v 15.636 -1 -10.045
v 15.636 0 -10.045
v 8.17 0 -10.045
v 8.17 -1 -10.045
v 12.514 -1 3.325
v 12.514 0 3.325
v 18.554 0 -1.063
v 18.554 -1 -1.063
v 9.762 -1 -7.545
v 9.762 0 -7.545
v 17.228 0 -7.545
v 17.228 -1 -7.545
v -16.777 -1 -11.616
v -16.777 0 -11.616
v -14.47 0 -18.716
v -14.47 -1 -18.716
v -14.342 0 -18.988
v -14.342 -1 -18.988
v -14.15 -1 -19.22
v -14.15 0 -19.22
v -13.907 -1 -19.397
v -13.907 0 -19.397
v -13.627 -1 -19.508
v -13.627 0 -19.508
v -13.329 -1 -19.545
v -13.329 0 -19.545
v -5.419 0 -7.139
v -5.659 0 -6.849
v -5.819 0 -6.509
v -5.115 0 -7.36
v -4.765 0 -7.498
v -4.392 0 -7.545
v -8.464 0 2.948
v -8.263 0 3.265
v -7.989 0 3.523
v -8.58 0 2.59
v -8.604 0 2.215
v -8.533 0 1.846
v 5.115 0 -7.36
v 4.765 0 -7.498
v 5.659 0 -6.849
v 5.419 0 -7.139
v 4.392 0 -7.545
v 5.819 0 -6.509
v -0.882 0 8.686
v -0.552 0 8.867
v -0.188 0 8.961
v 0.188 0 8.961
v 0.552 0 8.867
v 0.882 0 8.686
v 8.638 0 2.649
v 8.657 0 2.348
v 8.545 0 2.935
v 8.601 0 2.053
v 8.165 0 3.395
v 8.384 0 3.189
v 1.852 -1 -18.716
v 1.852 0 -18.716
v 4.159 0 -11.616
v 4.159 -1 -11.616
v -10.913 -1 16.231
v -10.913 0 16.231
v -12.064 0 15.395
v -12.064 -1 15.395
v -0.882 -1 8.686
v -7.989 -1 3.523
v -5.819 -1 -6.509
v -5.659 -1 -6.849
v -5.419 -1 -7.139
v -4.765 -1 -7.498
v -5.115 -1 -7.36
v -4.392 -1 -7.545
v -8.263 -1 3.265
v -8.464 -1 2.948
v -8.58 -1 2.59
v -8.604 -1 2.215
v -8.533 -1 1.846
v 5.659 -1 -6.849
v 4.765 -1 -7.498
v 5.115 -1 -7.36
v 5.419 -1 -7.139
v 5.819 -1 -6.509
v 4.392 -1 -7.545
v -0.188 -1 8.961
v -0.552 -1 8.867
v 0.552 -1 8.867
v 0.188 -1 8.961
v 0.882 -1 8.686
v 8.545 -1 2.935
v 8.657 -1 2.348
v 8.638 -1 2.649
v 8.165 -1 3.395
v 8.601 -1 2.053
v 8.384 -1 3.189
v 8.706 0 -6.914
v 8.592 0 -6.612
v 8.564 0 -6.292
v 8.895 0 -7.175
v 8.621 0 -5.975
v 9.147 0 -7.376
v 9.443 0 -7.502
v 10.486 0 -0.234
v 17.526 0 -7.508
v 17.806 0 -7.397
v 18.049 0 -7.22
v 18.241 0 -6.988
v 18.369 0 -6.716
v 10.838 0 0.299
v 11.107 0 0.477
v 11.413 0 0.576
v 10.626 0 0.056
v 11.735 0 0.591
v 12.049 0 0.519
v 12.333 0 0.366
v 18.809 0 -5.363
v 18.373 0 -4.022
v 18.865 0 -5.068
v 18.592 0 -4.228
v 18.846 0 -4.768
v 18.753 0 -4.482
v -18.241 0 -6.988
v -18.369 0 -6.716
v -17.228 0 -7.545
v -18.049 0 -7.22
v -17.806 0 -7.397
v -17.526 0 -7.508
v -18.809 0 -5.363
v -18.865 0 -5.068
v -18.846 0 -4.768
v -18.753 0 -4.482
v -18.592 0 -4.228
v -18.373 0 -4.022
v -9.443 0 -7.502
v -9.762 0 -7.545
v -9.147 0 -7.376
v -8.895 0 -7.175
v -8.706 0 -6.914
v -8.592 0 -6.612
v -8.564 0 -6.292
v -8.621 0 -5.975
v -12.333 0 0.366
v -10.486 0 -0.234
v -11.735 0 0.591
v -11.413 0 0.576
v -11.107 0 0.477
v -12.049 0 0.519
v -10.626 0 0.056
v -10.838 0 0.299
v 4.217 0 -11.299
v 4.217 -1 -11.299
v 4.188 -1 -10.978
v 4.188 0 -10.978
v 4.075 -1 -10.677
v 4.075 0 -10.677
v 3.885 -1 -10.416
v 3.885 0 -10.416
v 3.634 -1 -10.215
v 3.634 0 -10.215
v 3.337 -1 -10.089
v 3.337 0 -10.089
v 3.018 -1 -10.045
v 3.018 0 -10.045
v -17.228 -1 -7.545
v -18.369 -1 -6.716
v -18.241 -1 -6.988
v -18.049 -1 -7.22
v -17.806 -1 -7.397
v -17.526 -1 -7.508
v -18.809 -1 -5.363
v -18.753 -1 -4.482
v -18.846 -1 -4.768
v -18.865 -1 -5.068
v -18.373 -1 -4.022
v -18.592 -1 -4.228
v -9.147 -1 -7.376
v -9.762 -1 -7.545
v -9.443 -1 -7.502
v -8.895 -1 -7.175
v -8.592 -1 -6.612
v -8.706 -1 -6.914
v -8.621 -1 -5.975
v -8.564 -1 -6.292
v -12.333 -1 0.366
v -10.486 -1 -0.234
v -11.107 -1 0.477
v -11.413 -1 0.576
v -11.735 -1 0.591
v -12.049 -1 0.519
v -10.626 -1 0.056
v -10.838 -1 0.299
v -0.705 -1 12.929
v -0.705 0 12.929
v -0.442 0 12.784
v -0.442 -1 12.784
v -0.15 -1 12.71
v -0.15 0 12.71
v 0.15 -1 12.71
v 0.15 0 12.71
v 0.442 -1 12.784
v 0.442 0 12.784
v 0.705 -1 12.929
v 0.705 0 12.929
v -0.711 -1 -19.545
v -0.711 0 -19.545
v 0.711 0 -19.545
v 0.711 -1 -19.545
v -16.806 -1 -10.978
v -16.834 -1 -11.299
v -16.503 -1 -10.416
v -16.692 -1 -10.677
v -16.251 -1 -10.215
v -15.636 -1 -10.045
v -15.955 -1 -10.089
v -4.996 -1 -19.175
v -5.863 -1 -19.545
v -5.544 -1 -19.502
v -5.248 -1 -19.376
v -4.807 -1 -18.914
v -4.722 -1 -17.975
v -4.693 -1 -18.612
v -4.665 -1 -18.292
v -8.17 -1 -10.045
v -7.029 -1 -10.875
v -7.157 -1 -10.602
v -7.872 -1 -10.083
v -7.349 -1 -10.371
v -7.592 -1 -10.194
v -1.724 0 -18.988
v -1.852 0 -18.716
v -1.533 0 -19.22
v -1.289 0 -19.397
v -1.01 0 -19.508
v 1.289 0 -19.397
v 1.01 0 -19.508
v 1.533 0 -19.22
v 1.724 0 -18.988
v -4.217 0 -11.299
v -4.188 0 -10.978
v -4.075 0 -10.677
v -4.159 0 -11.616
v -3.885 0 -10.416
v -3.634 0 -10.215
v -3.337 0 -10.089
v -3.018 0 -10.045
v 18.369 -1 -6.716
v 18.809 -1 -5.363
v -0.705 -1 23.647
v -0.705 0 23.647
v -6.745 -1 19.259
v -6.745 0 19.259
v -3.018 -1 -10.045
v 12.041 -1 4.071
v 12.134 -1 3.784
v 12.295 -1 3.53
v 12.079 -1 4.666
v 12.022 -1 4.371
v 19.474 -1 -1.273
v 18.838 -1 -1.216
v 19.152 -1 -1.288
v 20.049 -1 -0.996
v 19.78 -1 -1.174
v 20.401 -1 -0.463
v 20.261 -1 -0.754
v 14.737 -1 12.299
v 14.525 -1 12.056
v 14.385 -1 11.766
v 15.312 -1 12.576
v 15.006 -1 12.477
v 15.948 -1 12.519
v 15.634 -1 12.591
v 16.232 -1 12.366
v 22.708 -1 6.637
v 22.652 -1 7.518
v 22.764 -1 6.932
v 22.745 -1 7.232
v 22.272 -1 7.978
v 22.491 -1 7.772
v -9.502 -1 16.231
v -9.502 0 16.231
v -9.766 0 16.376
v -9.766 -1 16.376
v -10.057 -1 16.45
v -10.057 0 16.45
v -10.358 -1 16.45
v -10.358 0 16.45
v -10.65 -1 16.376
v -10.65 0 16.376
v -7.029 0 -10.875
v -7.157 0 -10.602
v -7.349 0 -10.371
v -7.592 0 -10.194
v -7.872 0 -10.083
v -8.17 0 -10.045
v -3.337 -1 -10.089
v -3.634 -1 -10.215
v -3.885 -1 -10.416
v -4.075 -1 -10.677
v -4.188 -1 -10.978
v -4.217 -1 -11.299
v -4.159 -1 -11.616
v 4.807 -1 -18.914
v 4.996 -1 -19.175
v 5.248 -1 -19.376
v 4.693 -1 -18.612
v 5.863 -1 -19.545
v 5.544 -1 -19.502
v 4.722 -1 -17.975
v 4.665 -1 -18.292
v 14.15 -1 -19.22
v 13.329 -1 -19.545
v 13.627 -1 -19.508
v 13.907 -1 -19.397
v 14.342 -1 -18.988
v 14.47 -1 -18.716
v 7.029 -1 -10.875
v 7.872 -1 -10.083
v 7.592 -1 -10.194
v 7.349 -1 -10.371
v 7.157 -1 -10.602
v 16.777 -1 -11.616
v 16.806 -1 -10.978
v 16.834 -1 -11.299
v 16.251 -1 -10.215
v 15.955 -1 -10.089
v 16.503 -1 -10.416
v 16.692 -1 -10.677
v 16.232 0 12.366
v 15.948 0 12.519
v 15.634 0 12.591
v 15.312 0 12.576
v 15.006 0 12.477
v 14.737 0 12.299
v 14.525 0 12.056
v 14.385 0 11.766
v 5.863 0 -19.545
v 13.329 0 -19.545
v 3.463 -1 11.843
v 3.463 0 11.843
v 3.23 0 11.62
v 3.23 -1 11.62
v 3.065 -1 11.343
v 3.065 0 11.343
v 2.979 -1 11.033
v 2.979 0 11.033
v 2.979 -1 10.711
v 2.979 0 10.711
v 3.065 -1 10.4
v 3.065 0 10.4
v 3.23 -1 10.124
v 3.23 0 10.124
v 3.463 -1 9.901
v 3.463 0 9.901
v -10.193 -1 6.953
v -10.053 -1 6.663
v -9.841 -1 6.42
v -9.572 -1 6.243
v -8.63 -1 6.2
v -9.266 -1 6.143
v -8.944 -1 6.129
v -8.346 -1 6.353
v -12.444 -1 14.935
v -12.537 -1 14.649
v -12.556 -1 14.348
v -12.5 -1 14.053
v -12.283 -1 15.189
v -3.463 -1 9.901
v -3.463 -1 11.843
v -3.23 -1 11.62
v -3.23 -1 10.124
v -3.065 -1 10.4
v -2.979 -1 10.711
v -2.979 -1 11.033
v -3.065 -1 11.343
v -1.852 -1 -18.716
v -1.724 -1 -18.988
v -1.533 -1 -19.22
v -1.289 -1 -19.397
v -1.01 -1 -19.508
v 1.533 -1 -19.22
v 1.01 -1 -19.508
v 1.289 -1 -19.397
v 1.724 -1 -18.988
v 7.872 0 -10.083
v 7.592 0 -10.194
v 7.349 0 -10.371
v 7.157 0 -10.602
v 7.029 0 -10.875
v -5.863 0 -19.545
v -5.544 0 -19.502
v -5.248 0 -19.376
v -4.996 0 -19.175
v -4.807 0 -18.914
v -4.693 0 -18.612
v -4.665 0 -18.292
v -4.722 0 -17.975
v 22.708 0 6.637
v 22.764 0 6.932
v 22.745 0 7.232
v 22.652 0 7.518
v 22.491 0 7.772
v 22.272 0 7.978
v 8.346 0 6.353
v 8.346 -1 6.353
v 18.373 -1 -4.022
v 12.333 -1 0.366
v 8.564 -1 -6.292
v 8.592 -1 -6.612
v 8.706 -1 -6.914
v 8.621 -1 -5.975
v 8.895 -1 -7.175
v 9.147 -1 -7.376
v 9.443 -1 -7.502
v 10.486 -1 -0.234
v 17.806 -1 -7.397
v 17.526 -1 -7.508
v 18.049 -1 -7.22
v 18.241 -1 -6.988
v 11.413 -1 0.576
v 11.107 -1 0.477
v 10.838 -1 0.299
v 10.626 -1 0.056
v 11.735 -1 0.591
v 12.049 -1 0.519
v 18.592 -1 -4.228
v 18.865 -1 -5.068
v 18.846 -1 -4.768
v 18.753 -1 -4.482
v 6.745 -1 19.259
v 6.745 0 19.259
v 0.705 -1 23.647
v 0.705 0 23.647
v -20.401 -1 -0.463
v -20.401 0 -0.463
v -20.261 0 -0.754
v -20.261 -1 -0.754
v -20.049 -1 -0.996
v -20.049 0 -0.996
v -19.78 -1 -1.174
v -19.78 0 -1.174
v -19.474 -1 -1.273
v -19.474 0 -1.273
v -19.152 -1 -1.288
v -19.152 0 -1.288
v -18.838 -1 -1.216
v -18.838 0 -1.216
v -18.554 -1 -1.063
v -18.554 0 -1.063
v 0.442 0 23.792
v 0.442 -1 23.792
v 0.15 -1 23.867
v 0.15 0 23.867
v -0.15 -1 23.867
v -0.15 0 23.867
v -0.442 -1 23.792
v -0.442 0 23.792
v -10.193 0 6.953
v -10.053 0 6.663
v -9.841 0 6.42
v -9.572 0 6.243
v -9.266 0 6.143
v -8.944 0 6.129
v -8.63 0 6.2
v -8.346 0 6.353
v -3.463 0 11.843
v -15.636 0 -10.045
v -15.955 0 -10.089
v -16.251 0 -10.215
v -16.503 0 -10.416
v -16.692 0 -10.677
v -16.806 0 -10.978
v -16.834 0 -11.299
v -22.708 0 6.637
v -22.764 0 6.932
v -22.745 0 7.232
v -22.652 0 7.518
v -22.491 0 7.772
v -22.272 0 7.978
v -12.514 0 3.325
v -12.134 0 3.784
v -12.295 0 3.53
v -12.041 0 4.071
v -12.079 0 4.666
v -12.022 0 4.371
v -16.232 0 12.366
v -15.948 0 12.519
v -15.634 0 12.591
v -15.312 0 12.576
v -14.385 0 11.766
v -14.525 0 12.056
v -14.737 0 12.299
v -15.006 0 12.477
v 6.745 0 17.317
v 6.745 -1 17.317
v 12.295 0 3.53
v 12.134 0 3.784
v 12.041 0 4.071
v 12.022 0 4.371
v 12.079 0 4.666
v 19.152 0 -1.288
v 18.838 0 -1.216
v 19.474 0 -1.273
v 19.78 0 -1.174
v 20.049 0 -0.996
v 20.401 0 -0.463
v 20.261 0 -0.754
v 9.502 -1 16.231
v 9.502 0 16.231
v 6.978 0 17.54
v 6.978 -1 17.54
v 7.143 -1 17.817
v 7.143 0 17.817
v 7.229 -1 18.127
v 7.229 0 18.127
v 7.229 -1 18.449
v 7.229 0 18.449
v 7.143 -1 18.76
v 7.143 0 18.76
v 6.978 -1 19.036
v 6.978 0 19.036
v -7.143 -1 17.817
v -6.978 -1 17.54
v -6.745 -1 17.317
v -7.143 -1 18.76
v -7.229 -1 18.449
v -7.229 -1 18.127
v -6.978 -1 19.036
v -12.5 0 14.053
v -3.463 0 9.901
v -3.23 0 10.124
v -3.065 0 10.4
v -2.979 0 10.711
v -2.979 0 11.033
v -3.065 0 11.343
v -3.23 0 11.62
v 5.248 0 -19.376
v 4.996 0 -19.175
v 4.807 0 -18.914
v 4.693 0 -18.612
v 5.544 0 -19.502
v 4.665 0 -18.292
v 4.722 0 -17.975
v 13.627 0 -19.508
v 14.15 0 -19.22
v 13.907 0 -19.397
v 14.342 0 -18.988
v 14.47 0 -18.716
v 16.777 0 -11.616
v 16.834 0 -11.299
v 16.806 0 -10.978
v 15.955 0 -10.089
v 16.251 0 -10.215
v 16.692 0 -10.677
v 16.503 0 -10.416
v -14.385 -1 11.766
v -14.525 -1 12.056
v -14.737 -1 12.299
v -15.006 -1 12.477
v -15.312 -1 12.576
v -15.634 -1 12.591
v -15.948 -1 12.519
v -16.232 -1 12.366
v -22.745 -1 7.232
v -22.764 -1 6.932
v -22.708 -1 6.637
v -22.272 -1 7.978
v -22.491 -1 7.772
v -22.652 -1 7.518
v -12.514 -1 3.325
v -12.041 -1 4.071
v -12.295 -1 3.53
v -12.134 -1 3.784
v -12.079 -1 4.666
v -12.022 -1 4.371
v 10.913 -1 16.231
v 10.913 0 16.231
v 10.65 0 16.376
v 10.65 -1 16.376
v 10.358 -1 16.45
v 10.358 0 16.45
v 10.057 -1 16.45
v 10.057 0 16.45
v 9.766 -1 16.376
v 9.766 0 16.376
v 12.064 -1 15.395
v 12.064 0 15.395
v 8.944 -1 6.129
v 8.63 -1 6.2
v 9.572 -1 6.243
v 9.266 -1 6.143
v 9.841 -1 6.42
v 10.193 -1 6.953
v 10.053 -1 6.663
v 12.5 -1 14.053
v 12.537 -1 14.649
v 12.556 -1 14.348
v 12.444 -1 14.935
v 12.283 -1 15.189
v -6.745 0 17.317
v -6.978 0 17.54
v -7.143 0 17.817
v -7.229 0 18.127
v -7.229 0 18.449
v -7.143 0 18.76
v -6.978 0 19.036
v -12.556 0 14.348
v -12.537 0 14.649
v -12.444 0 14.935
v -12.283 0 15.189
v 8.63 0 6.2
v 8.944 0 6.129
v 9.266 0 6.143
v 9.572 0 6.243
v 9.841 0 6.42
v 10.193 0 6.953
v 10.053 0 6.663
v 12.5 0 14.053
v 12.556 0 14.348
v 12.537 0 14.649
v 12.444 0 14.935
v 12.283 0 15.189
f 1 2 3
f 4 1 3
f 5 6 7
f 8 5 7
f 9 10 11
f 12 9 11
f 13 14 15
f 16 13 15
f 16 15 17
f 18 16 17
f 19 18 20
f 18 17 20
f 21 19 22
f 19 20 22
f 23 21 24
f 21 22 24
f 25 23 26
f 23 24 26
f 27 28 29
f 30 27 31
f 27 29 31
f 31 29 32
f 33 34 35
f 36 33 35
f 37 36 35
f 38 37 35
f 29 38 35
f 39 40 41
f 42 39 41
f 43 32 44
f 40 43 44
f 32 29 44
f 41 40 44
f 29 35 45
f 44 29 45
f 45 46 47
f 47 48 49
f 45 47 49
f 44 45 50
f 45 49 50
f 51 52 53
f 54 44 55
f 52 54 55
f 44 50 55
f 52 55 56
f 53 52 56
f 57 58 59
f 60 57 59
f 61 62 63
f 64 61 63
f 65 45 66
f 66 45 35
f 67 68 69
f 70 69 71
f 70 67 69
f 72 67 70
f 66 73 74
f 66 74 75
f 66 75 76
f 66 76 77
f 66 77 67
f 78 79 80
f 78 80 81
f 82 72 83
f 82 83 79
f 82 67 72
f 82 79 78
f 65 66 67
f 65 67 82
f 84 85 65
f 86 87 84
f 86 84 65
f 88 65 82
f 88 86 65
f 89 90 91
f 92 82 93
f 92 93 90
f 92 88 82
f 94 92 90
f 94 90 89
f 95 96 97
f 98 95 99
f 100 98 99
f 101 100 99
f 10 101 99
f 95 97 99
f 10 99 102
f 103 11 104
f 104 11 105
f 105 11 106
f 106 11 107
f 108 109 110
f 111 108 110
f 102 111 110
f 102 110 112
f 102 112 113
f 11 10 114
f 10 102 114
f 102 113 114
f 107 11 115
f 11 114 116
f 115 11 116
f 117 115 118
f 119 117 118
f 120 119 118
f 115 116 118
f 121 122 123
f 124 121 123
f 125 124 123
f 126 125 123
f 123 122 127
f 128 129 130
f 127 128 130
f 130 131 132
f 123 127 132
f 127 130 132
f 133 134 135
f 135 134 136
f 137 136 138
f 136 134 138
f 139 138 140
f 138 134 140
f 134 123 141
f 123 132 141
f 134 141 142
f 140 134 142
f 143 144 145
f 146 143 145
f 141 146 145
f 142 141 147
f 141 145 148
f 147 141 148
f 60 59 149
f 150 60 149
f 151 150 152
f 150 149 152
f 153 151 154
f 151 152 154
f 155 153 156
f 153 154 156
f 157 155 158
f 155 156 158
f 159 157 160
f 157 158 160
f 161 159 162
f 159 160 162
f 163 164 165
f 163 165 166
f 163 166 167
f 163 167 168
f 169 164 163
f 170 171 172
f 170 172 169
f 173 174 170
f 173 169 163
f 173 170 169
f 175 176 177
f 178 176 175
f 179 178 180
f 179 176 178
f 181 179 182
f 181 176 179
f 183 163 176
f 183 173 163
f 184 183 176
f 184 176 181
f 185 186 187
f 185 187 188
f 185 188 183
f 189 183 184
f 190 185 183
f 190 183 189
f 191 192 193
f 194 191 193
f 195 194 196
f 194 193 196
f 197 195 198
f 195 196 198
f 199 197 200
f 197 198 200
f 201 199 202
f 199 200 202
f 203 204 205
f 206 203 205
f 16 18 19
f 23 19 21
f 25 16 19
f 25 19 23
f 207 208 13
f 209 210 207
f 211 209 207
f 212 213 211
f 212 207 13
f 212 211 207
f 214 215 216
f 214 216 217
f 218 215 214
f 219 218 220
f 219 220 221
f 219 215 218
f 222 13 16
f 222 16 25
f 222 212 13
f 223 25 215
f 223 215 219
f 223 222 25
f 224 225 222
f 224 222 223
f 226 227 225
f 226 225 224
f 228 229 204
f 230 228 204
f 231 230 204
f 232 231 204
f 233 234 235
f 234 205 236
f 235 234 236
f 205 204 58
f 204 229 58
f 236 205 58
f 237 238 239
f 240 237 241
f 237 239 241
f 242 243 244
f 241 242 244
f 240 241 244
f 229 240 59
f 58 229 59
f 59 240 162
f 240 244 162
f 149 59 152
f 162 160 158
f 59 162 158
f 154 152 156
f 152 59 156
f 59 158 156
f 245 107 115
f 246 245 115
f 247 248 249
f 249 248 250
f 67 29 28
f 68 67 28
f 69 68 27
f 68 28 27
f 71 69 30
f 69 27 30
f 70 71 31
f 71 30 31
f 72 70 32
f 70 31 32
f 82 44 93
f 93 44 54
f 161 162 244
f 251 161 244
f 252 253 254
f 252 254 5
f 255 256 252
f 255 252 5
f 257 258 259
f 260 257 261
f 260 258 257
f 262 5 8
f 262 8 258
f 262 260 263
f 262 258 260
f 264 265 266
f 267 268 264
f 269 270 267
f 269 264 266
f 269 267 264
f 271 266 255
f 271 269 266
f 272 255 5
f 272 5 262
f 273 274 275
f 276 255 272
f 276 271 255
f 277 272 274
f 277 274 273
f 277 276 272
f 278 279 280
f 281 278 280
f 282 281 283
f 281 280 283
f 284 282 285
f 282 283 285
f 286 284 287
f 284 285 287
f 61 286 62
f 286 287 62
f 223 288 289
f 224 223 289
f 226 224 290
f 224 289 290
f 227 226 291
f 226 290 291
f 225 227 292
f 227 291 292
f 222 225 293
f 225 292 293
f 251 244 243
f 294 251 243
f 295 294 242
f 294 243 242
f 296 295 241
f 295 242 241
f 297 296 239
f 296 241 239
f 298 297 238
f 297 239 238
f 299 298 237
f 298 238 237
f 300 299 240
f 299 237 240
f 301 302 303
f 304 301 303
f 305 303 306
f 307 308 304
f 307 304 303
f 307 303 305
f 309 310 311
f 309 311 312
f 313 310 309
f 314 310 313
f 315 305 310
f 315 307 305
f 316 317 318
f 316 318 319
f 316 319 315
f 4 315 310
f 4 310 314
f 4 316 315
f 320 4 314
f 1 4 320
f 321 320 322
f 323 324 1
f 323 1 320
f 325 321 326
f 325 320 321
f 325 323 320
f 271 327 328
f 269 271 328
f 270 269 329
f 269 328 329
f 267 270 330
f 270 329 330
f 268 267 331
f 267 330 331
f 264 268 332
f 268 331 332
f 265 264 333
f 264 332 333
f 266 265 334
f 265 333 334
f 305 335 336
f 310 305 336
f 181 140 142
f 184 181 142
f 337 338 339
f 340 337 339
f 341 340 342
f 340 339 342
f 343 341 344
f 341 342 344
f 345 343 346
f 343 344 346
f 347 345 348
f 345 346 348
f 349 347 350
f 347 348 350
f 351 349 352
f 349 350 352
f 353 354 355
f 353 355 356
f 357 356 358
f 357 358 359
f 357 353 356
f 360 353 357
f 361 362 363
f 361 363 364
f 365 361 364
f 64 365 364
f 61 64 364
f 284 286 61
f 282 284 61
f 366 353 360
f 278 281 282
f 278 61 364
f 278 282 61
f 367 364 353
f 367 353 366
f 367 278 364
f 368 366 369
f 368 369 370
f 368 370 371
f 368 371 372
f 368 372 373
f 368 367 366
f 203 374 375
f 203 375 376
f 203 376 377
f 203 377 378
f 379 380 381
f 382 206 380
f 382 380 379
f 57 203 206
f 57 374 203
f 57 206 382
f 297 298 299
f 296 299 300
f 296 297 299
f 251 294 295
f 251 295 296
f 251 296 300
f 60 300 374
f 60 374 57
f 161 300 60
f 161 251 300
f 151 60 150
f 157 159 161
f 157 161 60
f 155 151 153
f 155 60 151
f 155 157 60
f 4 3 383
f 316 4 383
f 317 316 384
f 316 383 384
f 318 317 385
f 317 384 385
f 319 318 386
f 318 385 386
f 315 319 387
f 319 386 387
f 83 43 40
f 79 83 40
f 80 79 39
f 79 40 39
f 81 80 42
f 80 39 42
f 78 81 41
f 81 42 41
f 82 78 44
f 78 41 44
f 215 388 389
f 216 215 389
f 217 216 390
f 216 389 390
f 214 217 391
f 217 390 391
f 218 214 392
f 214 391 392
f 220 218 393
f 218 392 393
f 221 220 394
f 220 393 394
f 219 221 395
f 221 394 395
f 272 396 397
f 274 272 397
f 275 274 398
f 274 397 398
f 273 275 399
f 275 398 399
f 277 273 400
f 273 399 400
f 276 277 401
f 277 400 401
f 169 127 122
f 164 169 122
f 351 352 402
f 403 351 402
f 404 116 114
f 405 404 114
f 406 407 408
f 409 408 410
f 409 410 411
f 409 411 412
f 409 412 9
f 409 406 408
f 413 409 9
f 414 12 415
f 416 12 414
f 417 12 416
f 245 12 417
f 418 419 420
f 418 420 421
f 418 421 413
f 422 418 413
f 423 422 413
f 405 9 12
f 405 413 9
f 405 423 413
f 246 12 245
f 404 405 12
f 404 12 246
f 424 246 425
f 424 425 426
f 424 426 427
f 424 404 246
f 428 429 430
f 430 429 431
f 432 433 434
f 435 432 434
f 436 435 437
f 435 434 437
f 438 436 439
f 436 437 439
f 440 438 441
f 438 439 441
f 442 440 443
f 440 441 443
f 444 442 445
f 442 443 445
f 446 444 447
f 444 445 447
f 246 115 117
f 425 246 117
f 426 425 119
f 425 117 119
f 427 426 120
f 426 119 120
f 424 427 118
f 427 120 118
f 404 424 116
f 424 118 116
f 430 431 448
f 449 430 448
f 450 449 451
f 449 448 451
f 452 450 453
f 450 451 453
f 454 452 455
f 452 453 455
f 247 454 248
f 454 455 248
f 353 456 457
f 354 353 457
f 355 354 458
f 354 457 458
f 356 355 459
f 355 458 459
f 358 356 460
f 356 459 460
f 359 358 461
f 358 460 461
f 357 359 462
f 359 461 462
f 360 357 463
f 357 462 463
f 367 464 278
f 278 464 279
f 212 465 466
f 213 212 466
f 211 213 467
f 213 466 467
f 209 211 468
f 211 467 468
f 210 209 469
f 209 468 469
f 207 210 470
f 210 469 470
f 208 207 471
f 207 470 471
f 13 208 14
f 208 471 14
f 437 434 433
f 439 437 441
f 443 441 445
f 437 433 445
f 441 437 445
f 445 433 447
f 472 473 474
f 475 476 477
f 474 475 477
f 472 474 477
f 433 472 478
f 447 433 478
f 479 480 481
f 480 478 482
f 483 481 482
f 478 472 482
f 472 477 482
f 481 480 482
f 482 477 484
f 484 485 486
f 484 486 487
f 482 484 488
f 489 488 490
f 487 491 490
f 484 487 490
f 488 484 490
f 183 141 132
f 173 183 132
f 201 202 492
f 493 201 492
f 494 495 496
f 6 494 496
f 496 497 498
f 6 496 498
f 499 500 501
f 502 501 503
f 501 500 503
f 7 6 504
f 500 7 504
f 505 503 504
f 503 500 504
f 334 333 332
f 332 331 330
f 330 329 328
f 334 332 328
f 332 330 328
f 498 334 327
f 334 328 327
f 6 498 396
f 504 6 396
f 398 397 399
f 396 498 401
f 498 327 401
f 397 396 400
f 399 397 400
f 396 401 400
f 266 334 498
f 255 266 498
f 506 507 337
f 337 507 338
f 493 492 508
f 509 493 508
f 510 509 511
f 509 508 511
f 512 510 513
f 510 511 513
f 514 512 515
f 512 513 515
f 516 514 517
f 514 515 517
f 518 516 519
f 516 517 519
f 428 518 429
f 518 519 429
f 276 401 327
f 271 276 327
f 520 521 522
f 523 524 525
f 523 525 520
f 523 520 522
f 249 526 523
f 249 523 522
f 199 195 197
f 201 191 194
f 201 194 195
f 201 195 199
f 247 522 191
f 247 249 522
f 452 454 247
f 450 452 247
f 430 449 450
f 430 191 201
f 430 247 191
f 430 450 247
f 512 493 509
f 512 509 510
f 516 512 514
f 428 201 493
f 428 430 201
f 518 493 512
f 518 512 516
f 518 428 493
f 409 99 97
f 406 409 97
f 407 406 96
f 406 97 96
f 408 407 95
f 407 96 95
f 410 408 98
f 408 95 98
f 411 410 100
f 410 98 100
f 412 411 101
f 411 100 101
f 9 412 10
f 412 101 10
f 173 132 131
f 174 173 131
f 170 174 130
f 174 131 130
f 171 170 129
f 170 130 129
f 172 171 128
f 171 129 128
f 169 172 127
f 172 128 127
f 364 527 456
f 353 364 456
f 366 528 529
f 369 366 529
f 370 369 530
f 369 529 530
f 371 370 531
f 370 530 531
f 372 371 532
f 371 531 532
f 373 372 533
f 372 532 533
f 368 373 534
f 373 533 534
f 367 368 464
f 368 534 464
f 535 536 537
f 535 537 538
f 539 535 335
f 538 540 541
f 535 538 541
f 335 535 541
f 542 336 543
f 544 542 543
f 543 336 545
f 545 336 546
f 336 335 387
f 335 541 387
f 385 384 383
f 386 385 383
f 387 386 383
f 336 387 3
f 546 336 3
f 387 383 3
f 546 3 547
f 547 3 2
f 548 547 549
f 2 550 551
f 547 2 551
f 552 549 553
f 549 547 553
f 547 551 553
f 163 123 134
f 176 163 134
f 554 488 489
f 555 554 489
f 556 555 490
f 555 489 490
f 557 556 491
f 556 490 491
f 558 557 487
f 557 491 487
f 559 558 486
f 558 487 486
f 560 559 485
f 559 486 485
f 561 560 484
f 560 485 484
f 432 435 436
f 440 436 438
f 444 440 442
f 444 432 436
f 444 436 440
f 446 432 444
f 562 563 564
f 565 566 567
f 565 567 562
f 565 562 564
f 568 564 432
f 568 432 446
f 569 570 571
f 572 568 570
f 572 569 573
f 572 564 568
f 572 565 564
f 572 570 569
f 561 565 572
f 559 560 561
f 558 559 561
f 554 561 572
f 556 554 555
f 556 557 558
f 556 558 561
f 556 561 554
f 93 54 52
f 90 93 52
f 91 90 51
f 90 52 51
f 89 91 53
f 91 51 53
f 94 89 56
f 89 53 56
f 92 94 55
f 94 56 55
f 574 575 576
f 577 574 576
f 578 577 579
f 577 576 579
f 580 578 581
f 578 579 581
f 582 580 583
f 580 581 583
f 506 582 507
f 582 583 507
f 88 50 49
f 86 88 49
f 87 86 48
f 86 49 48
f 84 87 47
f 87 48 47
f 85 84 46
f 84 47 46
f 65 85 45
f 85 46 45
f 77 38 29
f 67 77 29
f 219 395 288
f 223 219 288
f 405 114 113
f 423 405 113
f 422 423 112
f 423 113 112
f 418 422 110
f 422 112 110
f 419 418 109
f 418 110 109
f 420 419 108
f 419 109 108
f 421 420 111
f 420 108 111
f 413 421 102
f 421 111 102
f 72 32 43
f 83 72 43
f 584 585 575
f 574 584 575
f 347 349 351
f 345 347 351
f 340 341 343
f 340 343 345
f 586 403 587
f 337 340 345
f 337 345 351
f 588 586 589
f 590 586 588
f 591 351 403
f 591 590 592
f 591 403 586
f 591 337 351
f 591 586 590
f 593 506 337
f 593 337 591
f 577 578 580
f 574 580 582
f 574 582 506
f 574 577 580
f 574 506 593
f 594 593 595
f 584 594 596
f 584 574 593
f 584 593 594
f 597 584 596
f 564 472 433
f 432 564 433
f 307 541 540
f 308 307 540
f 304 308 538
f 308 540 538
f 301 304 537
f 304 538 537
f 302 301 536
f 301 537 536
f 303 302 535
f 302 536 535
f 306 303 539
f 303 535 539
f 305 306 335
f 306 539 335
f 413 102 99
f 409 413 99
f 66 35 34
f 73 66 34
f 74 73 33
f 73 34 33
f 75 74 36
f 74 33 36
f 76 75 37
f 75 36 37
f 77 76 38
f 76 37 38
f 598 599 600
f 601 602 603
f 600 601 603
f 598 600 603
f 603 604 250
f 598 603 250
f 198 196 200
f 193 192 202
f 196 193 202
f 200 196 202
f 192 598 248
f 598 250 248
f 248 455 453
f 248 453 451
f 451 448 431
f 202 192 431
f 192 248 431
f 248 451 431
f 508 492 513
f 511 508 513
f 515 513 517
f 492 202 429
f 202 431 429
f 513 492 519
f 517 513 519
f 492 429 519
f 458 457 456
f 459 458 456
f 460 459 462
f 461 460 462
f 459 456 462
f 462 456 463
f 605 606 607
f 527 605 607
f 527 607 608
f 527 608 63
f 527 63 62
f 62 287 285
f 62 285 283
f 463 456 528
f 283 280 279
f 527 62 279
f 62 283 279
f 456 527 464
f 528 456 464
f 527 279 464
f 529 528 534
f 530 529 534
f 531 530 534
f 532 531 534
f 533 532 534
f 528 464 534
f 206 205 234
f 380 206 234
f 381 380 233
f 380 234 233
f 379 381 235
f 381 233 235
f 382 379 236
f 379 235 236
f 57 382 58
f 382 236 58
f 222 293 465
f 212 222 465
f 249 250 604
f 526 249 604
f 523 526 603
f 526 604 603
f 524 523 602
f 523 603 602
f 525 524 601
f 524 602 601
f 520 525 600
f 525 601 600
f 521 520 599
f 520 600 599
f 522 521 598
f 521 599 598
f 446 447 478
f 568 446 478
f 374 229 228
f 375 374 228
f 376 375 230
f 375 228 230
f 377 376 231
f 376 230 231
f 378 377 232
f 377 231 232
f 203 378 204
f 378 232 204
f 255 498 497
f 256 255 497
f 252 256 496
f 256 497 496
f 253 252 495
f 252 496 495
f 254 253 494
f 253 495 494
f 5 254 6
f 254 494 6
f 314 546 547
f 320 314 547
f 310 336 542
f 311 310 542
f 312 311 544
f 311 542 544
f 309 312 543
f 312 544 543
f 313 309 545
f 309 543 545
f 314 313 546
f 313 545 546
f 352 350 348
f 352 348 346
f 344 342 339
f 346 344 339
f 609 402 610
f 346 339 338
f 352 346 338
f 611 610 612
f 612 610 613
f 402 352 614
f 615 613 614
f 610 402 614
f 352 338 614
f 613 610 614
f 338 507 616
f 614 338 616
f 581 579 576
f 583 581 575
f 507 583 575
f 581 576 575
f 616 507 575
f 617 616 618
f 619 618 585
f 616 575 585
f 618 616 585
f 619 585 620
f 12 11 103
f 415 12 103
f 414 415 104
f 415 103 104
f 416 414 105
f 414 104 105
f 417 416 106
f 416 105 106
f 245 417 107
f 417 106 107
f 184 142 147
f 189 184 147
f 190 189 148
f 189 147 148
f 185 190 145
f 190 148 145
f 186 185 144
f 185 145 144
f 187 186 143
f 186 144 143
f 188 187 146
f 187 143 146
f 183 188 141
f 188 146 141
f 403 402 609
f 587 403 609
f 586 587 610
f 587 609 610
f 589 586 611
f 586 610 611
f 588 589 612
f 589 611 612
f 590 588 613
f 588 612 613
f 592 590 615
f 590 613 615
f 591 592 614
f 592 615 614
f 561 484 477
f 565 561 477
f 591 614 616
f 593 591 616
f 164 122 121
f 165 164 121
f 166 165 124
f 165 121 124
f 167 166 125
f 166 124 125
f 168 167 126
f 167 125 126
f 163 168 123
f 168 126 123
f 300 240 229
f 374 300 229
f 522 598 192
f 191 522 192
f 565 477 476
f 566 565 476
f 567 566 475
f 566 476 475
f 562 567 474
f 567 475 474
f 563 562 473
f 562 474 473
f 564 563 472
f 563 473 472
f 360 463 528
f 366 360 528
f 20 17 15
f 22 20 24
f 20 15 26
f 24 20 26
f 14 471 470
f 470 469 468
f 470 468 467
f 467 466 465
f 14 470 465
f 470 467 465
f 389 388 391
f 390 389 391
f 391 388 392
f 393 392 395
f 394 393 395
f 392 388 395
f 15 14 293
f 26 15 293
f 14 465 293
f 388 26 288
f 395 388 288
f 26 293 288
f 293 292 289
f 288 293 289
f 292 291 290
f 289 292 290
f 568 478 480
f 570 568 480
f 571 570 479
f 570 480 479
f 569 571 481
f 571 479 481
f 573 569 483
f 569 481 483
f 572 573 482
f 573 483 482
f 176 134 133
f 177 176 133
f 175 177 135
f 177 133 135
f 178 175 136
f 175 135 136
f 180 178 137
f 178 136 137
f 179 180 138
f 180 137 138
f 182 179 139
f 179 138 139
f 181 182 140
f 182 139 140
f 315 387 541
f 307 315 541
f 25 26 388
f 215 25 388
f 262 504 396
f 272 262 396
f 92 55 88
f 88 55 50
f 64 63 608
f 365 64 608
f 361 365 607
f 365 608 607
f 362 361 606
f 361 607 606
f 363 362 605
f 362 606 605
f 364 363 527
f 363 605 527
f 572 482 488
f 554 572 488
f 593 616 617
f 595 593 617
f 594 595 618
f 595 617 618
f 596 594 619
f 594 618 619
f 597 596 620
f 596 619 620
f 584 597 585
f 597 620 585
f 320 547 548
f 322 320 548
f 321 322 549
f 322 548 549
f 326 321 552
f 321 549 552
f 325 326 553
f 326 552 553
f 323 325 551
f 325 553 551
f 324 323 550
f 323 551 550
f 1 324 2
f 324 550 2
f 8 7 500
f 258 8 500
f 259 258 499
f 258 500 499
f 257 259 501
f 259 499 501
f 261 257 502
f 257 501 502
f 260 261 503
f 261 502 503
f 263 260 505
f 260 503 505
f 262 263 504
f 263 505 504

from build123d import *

# Parameters (mm, degrees)
F1_DEPTH = 1


with BuildPart() as f1:
    # F0 (on Front) → F1 (new body)
    with BuildSketch(Plane.XZ):
        with BuildLine():
            ThreePointArc((-12.514456, 3.324552), (-12.078531, 3.924552), (-12.078531, 4.666193))
            Line((-12.078531, 4.666193), (-14.38546, 11.766193))
            ThreePointArc((-14.38546, 11.766193), (-15.155908, 12.536641), (-16.232071, 12.366193))
            Line((-16.232071, 12.366193), (-22.271691, 7.978152))
            ThreePointArc((-22.271691, 7.978152), (-22.707617, 7.378152), (-22.707617, 6.636511))
            Line((-22.707617, 6.636511), (-20.400687, -0.463489))
            ThreePointArc((-20.400687, -0.463489), (-19.63024, -1.233936), (-18.554077, -1.063489))
            Line((-18.554077, -1.063489), (-12.514456, 3.324552))
        make_face()
        with BuildLine():
            Line((-8.346267, 6.352919), (-3.462847, 9.900932))
            ThreePointArc((-3.462847, 9.900932), (-2.968189, 10.871752), (-3.462847, 11.842572))
            Line((-3.462847, 11.842572), (-9.502467, 16.230614))
            ThreePointArc((-9.502467, 16.230614), (-10.20781, 16.459793), (-10.913152, 16.230614))
            Line((-10.913152, 16.230614), (-12.063882, 15.39456))
            ThreePointArc((-12.063882, 15.39456), (-12.499807, 14.79456), (-12.499807, 14.052919))
            Line((-12.499807, 14.052919), (-10.192877, 6.952919))
            ThreePointArc((-10.192877, 6.952919), (-9.42243, 6.182472), (-8.346267, 6.352919))
        make_face()
        with BuildLine():
            ThreePointArc((-0.705342, 12.929298), (0, 12.700119), (0.705342, 12.929298))
            Line((0.705342, 12.929298), (6.744963, 17.31734))
            ThreePointArc((6.744963, 17.31734), (7.239621, 18.28816), (6.744963, 19.25898))
            Line((6.744963, 19.25898), (0.705342, 23.647022))
            ThreePointArc((0.705342, 23.647022), (0, 23.876201), (-0.705342, 23.647022))
            Line((-0.705342, 23.647022), (-6.744963, 19.25898))
            ThreePointArc((-6.744963, 19.25898), (-7.239621, 18.28816), (-6.744963, 17.31734))
            Line((-6.744963, 17.31734), (-0.705342, 12.929298))
        make_face()
        with BuildLine():
            Line((3.462847, 9.900932), (8.346267, 6.352919))
            ThreePointArc((8.346267, 6.352919), (9.42243, 6.182472), (10.192877, 6.952919))
            Line((10.192877, 6.952919), (12.499807, 14.052919))
            ThreePointArc((12.499807, 14.052919), (12.499807, 14.79456), (12.063882, 15.39456))
            Line((12.063882, 15.39456), (10.913152, 16.230614))
            ThreePointArc((10.913152, 16.230614), (10.20781, 16.459793), (9.502467, 16.230614))
            Line((9.502467, 16.230614), (3.462847, 11.842572))
            ThreePointArc((3.462847, 11.842572), (2.968189, 10.871752), (3.462847, 9.900932))
        make_face()
        with BuildLine():
            Line((-4.392264, -7.545432), (4.392264, -7.545432))
            ThreePointArc((4.392264, -7.545432), (5.273941, -7.258958), (5.818848, -6.508958))
            Line((5.818848, -6.508958), (8.600771, 2.052919))
            ThreePointArc((8.600771, 2.052919), (8.600771, 2.79456), (8.164845, 3.39456))
            Line((8.164845, 3.39456), (0.881678, 8.686091))
            ThreePointArc((0.881678, 8.686091), (0, 8.972565), (-0.881678, 8.686091))
            Line((-0.881678, 8.686091), (-7.98851, 3.522675))
            ThreePointArc((-7.98851, 3.522675), (-8.533417, 2.772675), (-8.533417, 1.845624))
            Line((-8.533417, 1.845624), (-5.818848, -6.508958))
            ThreePointArc((-5.818848, -6.508958), (-5.273941, -7.258958), (-4.392264, -7.545432))
        make_face()
        with BuildLine():
            Line((-8.621123, -5.974612), (-10.486424, -0.233807))
            ThreePointArc((-10.486424, -0.233807), (-11.256871, 0.536641), (-12.333034, 0.366193))
            Line((-12.333034, 0.366193), (-18.372655, -4.021848))
            ThreePointArc((-18.372655, -4.021848), (-18.80858, -4.621848), (-18.80858, -5.363489))
            Line((-18.80858, -5.363489), (-18.369041, -6.716253))
            ThreePointArc((-18.369041, -6.716253), (-17.933115, -7.316253), (-17.227773, -7.545432))
            Line((-17.227773, -7.545432), (-9.762391, -7.545432))
            ThreePointArc((-9.762391, -7.545432), (-8.791571, -7.050774), (-8.621123, -5.974612))
        make_face()
        with BuildLine():
            ThreePointArc((-14.470005, -18.716253), (-14.034079, -19.316253), (-13.328737, -19.545432))
            Line((-13.328737, -19.545432), (-5.863355, -19.545432))
            ThreePointArc((-5.863355, -19.545432), (-4.892534, -19.050774), (-4.722087, -17.974612))
            Line((-4.722087, -17.974612), (-7.029017, -10.874612))
            ThreePointArc((-7.029017, -10.874612), (-7.464942, -10.274612), (-8.170285, -10.045432))
            Line((-8.170285, -10.045432), (-15.635667, -10.045432))
            ThreePointArc((-15.635667, -10.045432), (-16.606487, -10.54009), (-16.776934, -11.616253))
            Line((-16.776934, -11.616253), (-14.470005, -18.716253))
        make_face()
        with BuildLine():
            Line((3.01812, -10.045432), (-3.01812, -10.045432))
            ThreePointArc((-3.01812, -10.045432), (-3.98894, -10.54009), (-4.159388, -11.616253))
            Line((-4.159388, -11.616253), (-1.852458, -18.716253))
            ThreePointArc((-1.852458, -18.716253), (-1.416532, -19.316253), (-0.71119, -19.545432))
            Line((-0.71119, -19.545432), (0.71119, -19.545432))
            ThreePointArc((0.71119, -19.545432), (1.416532, -19.316253), (1.852458, -18.716253))
            Line((1.852458, -18.716253), (4.159388, -11.616253))
            ThreePointArc((4.159388, -11.616253), (3.98894, -10.54009), (3.01812, -10.045432))
        make_face()
        with BuildLine():
            ThreePointArc((8.170285, -10.045432), (7.464942, -10.274612), (7.029017, -10.874612))
            Line((7.029017, -10.874612), (4.722087, -17.974612))
            ThreePointArc((4.722087, -17.974612), (4.892534, -19.050774), (5.863355, -19.545432))
            Line((5.863355, -19.545432), (13.328737, -19.545432))
            ThreePointArc((13.328737, -19.545432), (14.034079, -19.316253), (14.470005, -18.716253))
            Line((14.470005, -18.716253), (16.776934, -11.616253))
            ThreePointArc((16.776934, -11.616253), (16.606487, -10.54009), (15.635667, -10.045432))
            Line((15.635667, -10.045432), (8.170285, -10.045432))
        make_face()
        with BuildLine():
            Line((10.486424, -0.233807), (8.621123, -5.974612))
            ThreePointArc((8.621123, -5.974612), (8.791571, -7.050774), (9.762391, -7.545432))
            Line((9.762391, -7.545432), (17.227773, -7.545432))
            ThreePointArc((17.227773, -7.545432), (17.933115, -7.316253), (18.369041, -6.716253))
            Line((18.369041, -6.716253), (18.80858, -5.363489))
            ThreePointArc((18.80858, -5.363489), (18.80858, -4.621848), (18.372655, -4.021848))
            Line((18.372655, -4.021848), (12.333034, 0.366193))
            ThreePointArc((12.333034, 0.366193), (11.256871, 0.536641), (10.486424, -0.233807))
        make_face()
        with BuildLine():
            ThreePointArc((12.078531, 4.666193), (12.078531, 3.924552), (12.514456, 3.324552))
            Line((12.514456, 3.324552), (18.554077, -1.063489))
            ThreePointArc((18.554077, -1.063489), (19.63024, -1.233936), (20.400687, -0.463489))
            Line((20.400687, -0.463489), (22.707617, 6.636511))
            ThreePointArc((22.707617, 6.636511), (22.707617, 7.378152), (22.271691, 7.978152))
            Line((22.271691, 7.978152), (16.232071, 12.366193))
            ThreePointArc((16.232071, 12.366193), (15.155908, 12.536641), (14.38546, 11.766193))
            Line((14.38546, 11.766193), (12.078531, 4.666193))
        make_face()
    extrude(amount=F1_DEPTH)


solid = f1.part
